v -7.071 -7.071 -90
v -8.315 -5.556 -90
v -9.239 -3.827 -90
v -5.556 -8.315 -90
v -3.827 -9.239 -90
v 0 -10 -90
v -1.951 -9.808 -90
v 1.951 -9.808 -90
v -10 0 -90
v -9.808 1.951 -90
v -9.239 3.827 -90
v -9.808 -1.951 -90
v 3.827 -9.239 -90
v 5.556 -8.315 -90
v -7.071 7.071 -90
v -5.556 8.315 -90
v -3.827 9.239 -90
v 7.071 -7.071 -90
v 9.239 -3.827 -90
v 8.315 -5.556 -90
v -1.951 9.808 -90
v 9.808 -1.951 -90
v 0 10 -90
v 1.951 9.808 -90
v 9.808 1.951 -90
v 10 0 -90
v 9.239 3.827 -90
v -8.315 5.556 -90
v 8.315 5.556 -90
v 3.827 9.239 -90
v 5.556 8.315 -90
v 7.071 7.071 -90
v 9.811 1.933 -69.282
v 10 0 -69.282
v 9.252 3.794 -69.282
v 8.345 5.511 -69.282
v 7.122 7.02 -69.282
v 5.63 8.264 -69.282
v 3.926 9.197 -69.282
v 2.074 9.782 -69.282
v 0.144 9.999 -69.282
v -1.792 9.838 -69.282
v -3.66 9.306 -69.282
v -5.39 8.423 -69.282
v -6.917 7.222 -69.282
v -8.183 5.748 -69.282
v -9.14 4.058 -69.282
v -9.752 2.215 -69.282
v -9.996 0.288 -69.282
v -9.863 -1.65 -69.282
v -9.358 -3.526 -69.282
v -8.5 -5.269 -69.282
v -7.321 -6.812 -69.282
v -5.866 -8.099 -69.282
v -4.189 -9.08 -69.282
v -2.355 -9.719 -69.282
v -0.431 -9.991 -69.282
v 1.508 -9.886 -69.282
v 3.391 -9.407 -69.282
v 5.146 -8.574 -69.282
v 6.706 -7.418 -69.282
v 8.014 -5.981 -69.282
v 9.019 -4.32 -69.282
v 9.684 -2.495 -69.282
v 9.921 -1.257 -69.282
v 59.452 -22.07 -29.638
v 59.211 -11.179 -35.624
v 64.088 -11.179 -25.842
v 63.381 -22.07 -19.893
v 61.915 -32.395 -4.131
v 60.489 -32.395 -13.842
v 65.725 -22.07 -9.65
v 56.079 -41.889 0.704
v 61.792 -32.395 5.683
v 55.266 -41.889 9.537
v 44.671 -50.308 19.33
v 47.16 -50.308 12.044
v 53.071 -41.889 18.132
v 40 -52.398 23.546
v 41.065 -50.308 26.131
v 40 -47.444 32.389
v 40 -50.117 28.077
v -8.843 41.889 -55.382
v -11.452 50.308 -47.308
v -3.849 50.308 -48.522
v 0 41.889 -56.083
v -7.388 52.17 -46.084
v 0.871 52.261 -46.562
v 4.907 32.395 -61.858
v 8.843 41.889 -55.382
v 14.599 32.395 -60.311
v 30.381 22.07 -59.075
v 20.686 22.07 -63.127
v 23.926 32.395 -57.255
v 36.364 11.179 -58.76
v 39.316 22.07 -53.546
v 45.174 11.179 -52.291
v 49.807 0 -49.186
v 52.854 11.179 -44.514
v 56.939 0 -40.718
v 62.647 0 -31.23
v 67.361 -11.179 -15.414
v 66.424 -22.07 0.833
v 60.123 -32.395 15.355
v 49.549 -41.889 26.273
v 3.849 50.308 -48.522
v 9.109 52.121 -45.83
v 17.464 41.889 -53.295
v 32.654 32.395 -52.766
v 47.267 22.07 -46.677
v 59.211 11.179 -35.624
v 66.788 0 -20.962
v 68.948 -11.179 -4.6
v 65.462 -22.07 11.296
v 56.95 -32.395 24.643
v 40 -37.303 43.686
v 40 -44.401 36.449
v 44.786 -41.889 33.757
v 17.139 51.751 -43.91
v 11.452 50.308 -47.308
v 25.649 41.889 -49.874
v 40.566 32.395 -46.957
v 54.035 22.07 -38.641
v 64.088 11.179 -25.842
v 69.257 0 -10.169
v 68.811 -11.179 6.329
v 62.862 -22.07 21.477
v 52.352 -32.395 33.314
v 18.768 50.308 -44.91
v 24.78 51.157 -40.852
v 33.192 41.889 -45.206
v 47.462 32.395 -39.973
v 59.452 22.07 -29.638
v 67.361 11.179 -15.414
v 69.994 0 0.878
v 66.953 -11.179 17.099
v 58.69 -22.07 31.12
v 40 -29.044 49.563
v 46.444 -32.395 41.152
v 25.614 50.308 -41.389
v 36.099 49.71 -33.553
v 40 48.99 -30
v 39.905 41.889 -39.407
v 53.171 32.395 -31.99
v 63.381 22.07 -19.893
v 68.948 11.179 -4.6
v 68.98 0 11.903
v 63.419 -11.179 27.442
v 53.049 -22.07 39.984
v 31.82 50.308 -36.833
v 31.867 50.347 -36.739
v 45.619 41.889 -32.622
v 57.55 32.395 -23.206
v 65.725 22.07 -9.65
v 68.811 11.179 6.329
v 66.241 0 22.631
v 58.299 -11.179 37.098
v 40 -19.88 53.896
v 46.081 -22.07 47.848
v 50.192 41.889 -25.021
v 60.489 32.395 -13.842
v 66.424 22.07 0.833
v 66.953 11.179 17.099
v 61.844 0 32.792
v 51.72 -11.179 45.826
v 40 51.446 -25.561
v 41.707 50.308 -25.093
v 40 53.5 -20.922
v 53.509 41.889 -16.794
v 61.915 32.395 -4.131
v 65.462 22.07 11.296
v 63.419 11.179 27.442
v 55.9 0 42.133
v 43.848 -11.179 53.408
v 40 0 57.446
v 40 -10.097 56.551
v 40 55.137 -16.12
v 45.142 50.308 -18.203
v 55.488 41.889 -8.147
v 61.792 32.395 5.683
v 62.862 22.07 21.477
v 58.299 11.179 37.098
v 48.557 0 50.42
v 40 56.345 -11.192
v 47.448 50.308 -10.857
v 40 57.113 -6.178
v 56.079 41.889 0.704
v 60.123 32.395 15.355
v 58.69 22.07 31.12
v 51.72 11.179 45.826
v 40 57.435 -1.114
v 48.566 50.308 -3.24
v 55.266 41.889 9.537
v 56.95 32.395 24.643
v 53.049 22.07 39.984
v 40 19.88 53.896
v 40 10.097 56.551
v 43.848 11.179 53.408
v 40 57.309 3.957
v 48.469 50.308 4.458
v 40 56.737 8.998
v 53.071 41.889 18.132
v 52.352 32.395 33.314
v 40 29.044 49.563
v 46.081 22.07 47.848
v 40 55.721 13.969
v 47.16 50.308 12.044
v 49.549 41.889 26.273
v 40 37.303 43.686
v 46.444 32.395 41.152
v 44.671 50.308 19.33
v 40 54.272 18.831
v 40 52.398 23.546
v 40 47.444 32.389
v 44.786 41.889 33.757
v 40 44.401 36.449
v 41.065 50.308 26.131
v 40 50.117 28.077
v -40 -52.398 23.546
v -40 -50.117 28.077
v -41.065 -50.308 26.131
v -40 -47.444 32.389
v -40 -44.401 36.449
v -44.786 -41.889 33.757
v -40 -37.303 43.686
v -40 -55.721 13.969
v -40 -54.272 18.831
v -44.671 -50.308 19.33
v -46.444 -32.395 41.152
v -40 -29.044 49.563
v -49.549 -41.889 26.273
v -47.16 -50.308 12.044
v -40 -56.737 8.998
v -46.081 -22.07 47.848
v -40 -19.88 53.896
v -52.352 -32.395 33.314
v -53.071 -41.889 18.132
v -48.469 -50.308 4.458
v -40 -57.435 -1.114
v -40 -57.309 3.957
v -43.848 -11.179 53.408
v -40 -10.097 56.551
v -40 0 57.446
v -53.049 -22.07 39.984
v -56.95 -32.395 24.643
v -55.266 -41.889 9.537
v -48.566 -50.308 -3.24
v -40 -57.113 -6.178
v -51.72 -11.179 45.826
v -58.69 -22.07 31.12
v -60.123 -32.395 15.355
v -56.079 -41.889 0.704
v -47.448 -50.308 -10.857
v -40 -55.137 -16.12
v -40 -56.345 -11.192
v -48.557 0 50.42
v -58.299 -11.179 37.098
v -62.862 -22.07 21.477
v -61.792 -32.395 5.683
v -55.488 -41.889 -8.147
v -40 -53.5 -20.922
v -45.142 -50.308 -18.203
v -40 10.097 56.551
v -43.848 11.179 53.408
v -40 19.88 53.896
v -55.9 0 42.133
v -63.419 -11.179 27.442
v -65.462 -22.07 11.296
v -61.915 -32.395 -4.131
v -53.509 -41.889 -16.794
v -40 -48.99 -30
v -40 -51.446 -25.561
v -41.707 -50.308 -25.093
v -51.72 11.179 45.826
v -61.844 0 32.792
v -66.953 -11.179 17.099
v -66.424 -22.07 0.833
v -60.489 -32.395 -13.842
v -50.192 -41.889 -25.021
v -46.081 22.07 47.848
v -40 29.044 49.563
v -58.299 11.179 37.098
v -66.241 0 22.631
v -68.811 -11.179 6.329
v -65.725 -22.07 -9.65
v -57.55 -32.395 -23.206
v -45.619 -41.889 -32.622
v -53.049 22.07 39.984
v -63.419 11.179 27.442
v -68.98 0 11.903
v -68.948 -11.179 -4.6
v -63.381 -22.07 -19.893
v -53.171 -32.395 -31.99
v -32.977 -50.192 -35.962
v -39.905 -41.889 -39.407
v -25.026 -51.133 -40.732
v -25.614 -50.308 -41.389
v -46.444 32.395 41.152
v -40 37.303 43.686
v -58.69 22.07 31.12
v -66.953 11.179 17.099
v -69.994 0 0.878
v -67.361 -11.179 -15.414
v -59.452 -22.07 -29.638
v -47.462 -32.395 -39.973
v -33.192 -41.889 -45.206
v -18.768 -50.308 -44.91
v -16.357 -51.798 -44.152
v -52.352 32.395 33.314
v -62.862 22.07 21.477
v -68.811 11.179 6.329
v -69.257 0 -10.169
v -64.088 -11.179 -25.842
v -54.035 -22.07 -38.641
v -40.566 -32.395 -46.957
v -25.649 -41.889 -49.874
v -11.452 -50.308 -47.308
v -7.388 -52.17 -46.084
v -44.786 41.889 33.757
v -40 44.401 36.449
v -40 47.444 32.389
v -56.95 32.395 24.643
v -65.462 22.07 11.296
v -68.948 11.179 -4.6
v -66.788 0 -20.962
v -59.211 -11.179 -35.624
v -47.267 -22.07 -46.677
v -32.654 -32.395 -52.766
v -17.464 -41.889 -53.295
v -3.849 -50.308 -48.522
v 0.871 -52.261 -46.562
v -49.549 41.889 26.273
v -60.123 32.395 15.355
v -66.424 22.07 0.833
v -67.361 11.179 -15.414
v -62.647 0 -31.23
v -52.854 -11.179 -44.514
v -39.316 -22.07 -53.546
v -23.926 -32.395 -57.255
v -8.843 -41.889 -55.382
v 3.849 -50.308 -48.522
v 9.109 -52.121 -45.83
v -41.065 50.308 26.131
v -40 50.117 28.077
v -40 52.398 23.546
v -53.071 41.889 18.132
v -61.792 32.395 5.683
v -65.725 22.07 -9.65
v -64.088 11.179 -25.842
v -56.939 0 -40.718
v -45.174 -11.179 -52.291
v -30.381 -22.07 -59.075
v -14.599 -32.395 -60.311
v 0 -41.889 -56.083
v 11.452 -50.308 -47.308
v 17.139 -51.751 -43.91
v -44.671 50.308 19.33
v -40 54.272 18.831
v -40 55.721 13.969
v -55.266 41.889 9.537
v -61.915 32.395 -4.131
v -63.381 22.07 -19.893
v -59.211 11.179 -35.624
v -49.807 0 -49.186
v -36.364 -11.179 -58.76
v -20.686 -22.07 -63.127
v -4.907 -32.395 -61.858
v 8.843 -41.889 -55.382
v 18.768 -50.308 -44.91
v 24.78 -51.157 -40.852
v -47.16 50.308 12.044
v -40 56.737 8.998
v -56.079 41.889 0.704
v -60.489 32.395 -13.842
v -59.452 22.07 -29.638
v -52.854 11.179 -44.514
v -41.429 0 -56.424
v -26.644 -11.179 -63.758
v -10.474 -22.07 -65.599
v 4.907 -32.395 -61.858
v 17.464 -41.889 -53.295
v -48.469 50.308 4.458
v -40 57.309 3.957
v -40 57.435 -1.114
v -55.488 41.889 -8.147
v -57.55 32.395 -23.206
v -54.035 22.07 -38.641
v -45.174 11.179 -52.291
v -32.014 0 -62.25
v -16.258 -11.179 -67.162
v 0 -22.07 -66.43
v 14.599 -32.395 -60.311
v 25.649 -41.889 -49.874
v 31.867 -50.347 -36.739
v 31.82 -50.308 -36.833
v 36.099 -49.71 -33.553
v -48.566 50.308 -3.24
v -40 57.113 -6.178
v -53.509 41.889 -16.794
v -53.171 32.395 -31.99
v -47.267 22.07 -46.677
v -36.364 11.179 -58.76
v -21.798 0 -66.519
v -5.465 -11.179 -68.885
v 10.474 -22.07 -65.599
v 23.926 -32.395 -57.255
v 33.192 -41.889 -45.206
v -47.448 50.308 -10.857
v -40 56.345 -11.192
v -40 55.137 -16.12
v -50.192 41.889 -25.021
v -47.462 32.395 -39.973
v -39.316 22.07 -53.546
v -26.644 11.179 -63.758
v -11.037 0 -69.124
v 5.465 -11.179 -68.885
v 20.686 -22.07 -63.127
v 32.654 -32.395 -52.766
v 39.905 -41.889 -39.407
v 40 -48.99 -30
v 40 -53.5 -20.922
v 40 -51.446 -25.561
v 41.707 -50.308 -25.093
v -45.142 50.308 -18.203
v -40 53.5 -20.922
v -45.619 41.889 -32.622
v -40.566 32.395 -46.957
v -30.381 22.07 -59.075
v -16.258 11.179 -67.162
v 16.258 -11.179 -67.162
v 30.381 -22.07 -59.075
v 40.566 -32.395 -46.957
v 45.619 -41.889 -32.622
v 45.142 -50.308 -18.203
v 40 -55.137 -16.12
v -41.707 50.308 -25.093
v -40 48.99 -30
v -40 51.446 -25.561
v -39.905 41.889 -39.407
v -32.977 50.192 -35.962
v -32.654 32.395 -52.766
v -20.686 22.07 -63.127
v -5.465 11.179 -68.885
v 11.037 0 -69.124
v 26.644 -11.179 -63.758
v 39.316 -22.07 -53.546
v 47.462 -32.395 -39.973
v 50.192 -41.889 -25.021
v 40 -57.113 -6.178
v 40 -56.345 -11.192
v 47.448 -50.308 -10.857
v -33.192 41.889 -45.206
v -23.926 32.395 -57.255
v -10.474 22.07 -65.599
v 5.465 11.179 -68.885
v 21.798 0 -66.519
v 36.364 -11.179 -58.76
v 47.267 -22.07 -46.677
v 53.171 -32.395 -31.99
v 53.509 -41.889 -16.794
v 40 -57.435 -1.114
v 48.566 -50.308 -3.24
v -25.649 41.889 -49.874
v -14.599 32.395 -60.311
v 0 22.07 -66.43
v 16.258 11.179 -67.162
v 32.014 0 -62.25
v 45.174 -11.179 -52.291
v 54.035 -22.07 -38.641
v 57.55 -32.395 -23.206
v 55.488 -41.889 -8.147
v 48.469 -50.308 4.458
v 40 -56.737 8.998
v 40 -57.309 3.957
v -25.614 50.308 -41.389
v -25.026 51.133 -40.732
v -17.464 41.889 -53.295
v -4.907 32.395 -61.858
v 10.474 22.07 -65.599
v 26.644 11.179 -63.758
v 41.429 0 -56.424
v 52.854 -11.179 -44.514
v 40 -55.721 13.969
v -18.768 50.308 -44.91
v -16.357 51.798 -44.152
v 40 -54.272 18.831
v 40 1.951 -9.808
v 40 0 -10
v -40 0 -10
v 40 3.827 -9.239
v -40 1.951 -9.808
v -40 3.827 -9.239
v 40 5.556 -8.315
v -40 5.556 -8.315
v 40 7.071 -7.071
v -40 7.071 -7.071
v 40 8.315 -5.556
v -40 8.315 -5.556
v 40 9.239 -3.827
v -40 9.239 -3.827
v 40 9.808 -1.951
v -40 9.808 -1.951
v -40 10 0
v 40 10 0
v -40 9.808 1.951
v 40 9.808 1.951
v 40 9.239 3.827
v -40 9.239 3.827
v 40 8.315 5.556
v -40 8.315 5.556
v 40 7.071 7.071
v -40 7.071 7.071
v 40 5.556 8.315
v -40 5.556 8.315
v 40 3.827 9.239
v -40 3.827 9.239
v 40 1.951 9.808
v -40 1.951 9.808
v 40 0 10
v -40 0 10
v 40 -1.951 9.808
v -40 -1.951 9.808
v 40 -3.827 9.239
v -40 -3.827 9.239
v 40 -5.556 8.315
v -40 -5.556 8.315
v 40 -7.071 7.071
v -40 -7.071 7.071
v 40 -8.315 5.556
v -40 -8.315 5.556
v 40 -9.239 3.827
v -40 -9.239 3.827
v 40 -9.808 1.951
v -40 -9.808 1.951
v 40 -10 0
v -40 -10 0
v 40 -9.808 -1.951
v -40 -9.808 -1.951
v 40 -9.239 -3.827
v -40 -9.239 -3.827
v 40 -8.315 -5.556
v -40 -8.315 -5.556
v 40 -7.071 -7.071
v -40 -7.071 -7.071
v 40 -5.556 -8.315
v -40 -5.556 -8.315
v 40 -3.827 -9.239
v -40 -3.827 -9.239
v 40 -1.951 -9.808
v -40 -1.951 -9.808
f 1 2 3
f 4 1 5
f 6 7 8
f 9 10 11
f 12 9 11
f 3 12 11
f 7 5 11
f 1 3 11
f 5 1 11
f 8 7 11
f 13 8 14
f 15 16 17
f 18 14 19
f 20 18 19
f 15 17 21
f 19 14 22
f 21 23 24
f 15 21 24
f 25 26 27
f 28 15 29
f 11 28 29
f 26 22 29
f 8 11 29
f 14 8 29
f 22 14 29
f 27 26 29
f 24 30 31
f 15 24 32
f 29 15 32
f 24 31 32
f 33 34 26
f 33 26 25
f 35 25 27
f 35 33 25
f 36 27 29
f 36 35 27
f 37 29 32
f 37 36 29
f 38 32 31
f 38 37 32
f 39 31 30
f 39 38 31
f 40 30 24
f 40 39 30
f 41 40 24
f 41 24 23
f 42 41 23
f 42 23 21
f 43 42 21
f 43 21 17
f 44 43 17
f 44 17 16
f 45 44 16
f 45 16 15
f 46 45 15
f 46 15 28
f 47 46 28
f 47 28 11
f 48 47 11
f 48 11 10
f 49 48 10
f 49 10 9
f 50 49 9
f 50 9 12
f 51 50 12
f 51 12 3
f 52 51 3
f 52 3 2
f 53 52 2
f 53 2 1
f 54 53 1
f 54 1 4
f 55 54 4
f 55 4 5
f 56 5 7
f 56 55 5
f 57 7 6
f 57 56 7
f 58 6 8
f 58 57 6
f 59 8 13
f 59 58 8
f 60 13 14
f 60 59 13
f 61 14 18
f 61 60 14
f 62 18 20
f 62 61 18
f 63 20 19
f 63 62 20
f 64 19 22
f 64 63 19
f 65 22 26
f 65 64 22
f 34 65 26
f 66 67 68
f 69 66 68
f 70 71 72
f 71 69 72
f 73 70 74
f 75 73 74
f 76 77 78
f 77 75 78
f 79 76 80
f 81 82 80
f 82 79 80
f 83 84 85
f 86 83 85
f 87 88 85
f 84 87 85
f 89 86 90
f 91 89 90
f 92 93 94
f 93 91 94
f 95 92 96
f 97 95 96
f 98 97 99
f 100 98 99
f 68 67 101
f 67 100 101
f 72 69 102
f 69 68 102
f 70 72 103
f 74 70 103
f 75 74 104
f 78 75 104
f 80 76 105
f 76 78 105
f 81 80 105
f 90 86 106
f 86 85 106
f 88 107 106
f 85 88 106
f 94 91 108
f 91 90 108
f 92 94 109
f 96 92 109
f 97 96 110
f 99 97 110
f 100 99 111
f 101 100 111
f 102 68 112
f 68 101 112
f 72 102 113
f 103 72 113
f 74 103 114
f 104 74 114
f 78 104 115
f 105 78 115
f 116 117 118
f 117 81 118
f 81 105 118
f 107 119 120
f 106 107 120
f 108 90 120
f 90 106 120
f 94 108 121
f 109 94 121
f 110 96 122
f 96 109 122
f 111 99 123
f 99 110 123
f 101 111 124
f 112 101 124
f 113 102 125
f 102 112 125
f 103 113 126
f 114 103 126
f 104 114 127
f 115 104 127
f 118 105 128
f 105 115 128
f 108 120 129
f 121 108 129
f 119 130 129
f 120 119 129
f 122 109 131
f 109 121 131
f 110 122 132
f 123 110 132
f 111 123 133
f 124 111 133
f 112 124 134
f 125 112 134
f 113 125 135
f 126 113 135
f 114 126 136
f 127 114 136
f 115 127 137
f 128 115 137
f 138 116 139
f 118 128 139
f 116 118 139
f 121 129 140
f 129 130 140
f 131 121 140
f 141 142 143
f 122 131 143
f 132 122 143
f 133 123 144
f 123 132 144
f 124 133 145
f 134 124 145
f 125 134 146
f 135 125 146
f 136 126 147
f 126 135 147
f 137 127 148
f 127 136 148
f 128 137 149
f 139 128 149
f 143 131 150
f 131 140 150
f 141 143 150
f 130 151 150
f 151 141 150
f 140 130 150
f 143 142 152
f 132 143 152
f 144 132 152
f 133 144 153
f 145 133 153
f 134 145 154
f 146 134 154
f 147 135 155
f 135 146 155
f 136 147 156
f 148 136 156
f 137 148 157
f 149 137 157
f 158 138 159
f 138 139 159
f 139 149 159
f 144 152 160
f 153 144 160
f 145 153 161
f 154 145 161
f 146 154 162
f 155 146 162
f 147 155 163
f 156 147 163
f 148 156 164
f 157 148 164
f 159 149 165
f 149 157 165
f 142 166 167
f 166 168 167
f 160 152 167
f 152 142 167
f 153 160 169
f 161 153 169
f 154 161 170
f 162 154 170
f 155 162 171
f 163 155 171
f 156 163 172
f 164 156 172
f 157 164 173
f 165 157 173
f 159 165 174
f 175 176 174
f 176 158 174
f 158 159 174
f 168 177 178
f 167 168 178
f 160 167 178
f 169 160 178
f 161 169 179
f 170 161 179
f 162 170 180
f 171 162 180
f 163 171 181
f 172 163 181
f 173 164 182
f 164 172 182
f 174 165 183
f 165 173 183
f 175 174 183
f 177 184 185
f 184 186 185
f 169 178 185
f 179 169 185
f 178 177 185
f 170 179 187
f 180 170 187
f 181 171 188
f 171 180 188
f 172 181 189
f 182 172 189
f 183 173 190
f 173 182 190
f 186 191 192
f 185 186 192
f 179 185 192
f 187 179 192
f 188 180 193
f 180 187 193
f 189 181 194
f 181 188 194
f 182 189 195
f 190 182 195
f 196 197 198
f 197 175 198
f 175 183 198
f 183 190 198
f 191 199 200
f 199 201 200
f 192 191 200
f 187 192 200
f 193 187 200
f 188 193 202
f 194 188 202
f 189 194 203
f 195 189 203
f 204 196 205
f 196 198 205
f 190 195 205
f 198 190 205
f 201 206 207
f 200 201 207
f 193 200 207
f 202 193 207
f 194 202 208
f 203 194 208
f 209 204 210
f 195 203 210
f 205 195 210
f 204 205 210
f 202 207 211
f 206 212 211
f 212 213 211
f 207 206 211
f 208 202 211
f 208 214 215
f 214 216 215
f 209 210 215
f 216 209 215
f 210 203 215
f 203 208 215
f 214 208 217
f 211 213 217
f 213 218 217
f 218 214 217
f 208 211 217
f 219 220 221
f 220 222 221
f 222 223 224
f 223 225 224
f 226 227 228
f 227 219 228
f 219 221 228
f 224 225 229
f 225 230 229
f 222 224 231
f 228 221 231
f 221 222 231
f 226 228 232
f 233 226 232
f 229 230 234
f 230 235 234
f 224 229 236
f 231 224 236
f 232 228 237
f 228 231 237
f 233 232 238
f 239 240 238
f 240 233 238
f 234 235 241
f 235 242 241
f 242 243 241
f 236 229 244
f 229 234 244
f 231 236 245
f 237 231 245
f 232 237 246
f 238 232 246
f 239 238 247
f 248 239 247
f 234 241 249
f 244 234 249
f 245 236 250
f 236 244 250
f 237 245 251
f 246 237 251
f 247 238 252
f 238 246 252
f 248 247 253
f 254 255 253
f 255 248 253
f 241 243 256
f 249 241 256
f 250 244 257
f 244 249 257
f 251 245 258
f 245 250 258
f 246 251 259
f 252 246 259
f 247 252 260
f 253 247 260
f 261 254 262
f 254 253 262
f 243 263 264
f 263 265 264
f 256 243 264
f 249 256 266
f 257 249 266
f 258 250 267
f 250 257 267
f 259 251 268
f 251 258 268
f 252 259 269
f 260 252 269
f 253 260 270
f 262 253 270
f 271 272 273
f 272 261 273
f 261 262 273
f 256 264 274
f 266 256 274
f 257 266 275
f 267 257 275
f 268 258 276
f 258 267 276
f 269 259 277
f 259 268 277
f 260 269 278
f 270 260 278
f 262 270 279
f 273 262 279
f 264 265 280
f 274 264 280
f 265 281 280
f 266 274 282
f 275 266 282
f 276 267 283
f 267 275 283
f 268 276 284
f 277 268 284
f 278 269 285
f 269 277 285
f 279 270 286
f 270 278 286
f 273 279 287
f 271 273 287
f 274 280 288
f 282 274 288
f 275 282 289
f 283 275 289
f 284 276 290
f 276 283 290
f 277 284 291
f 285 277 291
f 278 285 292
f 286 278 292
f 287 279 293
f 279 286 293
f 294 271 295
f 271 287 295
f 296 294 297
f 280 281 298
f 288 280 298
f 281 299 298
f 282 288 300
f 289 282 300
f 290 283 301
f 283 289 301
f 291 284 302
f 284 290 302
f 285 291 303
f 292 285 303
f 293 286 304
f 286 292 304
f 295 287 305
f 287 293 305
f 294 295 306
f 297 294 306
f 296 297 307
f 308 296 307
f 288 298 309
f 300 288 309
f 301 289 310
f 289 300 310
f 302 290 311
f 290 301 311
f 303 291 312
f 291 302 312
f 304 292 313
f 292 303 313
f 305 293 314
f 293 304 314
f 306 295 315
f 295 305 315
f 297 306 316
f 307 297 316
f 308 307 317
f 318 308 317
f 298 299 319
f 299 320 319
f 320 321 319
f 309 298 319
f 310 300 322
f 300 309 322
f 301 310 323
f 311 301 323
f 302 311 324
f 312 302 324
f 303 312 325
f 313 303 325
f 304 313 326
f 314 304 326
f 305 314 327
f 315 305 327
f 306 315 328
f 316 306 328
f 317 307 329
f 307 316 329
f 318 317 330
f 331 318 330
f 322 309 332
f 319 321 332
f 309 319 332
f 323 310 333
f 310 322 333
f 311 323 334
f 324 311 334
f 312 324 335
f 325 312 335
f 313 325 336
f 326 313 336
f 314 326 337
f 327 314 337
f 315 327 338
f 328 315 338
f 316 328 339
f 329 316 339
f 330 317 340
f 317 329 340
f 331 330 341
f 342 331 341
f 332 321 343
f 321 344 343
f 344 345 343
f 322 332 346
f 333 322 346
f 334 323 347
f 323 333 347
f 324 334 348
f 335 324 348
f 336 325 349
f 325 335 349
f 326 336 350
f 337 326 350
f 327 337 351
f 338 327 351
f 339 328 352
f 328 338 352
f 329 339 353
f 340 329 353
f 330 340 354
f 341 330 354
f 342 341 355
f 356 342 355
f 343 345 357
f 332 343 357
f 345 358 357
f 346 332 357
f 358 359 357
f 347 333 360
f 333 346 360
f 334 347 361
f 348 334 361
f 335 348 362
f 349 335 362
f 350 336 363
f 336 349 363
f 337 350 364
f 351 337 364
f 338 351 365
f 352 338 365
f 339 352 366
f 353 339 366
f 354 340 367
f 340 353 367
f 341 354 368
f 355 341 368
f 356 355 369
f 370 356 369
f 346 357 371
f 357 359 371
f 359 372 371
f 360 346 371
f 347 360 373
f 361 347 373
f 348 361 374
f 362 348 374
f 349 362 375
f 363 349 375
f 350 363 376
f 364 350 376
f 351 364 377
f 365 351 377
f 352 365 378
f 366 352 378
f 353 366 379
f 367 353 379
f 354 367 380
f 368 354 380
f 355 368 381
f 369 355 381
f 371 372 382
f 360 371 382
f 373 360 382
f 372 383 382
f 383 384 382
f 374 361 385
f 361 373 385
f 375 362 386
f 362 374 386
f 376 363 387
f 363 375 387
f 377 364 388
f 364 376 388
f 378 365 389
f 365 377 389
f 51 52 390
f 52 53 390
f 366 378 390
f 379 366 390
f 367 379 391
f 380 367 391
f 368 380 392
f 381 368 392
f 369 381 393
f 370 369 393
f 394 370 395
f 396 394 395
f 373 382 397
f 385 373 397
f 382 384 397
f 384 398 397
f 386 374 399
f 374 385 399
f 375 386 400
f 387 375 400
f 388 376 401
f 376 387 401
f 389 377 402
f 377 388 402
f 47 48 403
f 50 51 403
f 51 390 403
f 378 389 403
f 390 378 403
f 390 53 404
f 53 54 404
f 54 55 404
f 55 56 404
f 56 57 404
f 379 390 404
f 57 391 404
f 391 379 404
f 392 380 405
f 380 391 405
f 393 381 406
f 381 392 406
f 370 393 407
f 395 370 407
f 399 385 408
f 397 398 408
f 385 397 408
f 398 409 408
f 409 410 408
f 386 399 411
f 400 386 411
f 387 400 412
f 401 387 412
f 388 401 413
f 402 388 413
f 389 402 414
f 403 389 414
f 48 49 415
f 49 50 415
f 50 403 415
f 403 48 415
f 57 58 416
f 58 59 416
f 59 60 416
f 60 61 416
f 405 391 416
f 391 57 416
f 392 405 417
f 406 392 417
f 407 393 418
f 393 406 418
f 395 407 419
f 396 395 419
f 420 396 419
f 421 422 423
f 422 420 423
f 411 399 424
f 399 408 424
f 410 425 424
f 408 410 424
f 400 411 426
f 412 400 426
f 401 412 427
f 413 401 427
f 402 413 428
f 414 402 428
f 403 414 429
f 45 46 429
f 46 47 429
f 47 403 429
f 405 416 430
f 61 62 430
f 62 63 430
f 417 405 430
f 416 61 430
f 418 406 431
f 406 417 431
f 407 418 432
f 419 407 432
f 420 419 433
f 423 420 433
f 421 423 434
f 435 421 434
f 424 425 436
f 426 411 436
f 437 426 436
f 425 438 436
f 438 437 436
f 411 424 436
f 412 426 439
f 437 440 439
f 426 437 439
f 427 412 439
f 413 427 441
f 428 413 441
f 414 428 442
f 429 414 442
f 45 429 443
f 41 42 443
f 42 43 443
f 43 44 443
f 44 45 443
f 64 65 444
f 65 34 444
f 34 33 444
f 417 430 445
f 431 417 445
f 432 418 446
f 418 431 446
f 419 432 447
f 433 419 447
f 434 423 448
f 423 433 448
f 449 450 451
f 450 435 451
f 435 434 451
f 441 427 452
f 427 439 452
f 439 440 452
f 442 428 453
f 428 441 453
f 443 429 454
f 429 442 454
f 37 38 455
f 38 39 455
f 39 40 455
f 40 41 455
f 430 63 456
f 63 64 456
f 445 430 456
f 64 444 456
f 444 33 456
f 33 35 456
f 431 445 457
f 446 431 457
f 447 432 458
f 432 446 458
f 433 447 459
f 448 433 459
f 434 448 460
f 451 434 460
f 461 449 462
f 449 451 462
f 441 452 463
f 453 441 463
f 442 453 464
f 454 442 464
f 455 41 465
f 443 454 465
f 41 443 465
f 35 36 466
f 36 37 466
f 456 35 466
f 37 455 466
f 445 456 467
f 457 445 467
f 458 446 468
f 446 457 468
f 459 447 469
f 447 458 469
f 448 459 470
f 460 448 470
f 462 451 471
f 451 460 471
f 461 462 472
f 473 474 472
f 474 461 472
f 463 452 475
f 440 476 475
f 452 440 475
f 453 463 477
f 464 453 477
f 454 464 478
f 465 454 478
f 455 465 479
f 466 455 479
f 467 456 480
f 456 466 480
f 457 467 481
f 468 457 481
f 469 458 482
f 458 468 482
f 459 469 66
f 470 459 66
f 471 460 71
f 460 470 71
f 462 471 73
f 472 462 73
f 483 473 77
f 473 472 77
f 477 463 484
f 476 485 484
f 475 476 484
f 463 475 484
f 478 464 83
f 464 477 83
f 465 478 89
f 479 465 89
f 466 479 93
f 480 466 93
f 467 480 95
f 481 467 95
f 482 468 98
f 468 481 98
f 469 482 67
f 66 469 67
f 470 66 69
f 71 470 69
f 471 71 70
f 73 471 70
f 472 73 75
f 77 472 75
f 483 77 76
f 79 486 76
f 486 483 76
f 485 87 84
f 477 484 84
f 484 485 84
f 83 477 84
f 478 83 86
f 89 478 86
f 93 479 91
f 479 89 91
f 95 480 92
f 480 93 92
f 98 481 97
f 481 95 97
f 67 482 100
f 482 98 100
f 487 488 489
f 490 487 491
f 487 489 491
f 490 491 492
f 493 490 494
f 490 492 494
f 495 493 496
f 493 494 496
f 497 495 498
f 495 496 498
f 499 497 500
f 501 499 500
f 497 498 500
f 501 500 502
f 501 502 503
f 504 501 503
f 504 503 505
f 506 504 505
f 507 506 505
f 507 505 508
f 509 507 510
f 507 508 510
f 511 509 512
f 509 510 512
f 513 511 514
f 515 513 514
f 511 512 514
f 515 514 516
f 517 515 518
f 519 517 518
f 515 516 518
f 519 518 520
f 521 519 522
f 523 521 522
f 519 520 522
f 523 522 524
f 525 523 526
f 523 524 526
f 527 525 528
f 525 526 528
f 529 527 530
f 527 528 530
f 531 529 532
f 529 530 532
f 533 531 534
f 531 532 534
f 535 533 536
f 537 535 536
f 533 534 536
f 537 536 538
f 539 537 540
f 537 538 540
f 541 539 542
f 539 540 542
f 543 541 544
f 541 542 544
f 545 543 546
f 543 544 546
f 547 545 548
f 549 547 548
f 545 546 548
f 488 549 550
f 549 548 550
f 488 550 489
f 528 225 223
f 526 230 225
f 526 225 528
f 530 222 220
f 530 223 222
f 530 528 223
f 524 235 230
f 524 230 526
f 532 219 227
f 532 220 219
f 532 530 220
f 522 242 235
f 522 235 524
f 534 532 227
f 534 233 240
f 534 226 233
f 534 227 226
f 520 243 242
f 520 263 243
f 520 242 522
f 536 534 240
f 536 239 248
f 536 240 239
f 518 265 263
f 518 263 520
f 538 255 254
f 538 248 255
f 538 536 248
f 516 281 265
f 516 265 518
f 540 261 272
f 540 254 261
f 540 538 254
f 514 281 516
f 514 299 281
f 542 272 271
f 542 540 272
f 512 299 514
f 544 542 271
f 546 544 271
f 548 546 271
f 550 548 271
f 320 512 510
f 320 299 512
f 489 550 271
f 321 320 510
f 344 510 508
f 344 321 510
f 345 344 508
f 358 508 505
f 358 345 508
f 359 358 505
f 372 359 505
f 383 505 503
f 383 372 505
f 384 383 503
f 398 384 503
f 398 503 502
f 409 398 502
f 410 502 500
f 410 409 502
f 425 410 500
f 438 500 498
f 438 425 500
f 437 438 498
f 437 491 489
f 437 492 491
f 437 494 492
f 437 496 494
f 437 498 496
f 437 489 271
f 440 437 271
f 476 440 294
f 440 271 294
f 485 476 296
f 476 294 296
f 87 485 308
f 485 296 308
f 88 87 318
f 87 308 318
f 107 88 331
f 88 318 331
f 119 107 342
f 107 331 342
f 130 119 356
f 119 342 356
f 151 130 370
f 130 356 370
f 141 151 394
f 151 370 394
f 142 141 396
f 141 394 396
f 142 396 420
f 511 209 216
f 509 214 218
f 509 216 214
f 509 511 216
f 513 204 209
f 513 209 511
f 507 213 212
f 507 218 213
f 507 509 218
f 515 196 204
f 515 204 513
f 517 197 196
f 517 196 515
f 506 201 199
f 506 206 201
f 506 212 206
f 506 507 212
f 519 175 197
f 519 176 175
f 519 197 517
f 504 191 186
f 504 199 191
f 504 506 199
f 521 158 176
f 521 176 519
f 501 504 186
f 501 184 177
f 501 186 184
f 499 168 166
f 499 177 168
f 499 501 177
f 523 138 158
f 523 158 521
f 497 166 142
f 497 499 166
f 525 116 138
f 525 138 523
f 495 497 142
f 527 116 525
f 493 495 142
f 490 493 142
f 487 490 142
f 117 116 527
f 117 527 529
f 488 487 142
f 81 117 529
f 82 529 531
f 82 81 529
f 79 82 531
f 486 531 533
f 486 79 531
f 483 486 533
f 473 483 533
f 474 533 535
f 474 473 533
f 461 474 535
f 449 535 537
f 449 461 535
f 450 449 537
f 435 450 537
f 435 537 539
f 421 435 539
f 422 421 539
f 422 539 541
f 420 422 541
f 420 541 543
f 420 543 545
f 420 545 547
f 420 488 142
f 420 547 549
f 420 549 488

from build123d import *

# Parameters (mm, degrees)
SKETCH4_W               = 80
SKETCH4_H               = 100
CUT_EXTRUDE1_DEPTH      = 200
CUT_EXTRUDE1_DEPTH_BACK = 200
SKETCH5_R               = 10
BOSS_EXTRUDE1_DEPTH     = 60
SKETCH6_R               = 10
BOSS_EXTRUDE2_DEPTH     = 80
CUT_EXTRUDE2_DEPTH      = 64.245553203
CUT_EXTRUDE2_DEPTH_BACK = 64.245553203


with BuildPart() as part:
    # Sketch3 → Revolve1 (revolve)
    with BuildSketch(Plane.XY):
        with BuildLine():
            Line((0, 70), (0, -70))
            ThreePointArc((0, -70), (70, 0), (0, 70))
        make_face()
    revolve(axis=Axis((0, 136.094420601, 0), (0, -1, 0)))

    # Sketch4 → Cut-Extrude1 (cut, two sides)
    with BuildSketch(Plane(origin=(0, 0, 0), x_dir=(1, 0, 0), z_dir=(0, 1, 0))) as cut_extrude1_sk:
        with Locations((0, -20)):
            Rectangle(SKETCH4_W, SKETCH4_H)
    extrude(amount=CUT_EXTRUDE1_DEPTH, mode=Mode.SUBTRACT)
    extrude(cut_extrude1_sk.sketch, amount=-CUT_EXTRUDE1_DEPTH_BACK, mode=Mode.SUBTRACT)

    # Sketch5 → Boss-Extrude1 (add)
    with BuildSketch(Plane.XY.offset(-30)):
        Circle(SKETCH5_R)
    extrude(amount=-BOSS_EXTRUDE1_DEPTH)

    # Sketch6 → Boss-Extrude2 (add)
    with BuildSketch(Plane(origin=(-40, 0, 0), x_dir=(0, 0, -1), z_dir=(1, 0, 0))):
        Circle(SKETCH6_R)
    extrude(amount=BOSS_EXTRUDE2_DEPTH)

    # Sketch7 → Cut-Extrude2 (cut, two sides)
    with BuildSketch(Plane(origin=(0, 0, 0), x_dir=(1, 0, 0), z_dir=(0, 1, 0))) as cut_extrude2_sk:
        with BuildLine():
            Line((40, 30), (-40, 30))
            ThreePointArc((-40, 30), (0, 46.568542495), (40, 30))
        make_face()
    extrude(amount=CUT_EXTRUDE2_DEPTH, mode=Mode.SUBTRACT)
    extrude(cut_extrude2_sk.sketch, amount=-CUT_EXTRUDE2_DEPTH_BACK, mode=Mode.SUBTRACT)


solid = part.part
